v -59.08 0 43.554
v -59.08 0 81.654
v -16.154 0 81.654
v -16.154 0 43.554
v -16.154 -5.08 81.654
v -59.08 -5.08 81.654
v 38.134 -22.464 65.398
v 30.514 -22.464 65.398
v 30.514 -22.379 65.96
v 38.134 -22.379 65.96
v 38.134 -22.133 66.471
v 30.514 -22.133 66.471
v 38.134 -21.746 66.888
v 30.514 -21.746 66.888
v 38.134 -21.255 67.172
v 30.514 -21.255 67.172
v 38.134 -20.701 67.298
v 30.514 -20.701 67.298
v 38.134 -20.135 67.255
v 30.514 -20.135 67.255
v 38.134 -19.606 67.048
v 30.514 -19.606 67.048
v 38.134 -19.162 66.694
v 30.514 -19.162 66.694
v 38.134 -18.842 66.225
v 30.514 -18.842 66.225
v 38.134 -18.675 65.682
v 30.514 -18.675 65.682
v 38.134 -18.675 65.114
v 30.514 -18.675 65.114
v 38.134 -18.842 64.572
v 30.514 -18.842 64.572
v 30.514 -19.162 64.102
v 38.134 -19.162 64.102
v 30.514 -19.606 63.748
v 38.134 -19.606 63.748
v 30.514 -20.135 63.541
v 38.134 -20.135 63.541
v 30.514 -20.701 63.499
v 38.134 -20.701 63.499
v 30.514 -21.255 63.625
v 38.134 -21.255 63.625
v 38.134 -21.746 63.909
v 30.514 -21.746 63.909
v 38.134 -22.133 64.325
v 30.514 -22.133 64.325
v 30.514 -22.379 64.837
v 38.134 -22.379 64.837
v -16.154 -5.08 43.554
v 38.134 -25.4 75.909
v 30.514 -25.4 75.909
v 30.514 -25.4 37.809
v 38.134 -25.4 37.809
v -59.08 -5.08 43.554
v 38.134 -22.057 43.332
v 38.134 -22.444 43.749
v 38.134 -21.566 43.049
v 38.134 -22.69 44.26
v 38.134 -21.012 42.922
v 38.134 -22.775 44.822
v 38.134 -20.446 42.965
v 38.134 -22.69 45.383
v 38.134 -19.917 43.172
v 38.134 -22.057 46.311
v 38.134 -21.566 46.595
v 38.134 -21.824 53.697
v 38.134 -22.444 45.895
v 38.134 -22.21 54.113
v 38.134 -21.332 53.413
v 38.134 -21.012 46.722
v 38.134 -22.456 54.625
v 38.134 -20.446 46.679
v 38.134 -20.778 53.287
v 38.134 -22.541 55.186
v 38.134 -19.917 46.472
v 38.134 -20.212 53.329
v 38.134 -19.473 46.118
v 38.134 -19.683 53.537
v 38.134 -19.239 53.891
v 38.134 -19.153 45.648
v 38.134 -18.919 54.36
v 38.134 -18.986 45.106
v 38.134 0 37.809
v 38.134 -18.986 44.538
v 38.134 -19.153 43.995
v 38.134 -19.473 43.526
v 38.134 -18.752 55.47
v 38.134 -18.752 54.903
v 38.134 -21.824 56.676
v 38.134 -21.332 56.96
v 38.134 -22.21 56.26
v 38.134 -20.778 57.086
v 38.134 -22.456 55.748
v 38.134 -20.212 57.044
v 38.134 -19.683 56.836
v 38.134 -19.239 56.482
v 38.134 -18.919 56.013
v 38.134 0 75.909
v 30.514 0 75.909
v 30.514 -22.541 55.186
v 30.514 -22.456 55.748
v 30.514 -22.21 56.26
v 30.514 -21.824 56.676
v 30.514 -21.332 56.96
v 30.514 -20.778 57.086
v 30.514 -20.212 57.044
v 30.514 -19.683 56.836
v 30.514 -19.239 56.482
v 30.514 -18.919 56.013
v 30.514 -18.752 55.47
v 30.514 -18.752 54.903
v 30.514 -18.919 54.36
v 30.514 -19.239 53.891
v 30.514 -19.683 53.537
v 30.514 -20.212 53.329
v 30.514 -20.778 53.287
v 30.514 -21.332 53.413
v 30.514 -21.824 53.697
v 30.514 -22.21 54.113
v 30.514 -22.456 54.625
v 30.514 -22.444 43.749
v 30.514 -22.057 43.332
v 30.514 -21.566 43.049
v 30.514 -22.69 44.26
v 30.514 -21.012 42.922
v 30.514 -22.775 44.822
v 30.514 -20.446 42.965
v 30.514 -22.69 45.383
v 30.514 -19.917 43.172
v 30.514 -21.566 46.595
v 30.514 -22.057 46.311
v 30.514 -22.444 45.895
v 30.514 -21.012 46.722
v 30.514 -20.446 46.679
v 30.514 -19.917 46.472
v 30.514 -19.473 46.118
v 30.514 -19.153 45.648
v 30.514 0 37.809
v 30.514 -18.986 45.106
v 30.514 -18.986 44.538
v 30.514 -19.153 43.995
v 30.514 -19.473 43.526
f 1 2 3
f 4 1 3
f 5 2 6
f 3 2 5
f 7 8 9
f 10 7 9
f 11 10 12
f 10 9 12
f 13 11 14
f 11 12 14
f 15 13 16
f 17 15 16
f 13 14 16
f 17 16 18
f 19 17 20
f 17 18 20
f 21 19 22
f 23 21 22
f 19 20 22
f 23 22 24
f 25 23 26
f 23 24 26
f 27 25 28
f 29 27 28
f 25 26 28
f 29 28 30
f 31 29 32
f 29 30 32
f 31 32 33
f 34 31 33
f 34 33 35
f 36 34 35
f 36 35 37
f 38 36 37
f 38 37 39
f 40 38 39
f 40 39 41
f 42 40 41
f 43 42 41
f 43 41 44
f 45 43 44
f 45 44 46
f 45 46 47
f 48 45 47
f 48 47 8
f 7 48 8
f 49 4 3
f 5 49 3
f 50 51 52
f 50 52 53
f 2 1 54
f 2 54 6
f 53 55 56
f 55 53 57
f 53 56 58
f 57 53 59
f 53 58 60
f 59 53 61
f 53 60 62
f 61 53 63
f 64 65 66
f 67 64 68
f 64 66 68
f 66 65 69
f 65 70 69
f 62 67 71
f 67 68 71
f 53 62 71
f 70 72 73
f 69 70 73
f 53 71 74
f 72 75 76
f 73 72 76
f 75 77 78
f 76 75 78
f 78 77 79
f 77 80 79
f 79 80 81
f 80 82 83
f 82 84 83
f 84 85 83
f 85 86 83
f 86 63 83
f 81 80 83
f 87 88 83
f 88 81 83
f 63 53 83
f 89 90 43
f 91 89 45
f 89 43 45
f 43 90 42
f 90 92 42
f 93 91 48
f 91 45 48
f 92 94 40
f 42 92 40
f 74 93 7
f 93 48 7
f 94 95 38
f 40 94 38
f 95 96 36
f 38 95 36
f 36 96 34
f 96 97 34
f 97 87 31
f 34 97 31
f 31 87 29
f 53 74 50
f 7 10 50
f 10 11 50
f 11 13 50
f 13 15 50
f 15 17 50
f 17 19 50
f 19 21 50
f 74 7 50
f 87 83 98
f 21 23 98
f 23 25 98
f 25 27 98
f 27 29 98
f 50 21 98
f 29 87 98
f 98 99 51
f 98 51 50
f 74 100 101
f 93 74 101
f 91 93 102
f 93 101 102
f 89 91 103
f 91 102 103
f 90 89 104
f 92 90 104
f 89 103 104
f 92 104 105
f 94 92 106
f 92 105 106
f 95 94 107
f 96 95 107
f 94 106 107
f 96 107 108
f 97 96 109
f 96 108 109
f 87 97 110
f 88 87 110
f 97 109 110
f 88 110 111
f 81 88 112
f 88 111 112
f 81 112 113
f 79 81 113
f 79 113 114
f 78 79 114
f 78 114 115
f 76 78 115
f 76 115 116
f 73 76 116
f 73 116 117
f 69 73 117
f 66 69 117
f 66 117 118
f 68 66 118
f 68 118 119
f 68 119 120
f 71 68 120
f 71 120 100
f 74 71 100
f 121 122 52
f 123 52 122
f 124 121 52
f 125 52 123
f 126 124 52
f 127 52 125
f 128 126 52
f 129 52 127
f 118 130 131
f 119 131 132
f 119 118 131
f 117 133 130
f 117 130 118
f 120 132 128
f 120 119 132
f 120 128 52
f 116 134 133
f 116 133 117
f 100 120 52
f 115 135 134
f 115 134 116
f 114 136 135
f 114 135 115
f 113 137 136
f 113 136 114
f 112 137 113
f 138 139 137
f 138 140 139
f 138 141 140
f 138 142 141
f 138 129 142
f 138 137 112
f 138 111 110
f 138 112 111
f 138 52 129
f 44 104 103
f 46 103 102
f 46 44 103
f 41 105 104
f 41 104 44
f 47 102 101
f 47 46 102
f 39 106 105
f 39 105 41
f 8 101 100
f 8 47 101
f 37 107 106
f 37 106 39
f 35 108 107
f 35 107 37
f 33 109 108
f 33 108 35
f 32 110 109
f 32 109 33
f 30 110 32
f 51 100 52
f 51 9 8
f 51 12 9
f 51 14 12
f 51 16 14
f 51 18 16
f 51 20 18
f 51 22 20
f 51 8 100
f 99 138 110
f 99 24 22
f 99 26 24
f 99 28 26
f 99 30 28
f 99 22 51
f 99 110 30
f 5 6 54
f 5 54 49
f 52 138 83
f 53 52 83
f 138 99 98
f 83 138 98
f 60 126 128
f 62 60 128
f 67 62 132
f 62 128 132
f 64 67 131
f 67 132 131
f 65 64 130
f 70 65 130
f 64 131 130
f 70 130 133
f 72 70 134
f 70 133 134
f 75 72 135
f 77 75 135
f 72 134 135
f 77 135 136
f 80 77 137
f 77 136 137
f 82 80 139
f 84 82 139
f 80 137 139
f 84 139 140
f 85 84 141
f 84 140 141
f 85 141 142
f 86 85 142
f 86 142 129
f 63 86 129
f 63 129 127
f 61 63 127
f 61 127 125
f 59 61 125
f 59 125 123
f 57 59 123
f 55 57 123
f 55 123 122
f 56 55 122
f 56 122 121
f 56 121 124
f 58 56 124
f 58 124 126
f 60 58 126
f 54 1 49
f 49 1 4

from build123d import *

# Parameters (mm, degrees)
F0_W     = 42.926
F0_H     = 38.1
F1_DEPTH = 5.08
F2_W     = 7.62
F2_H     = 38.1
F3_DEPTH = 25.4
F4_R     = 1.905
F5_DEPTH = 25.4


with BuildPart() as f1:
    # F0 (on Front) → F1 (new body)
    with BuildSketch(Plane.XZ):
        with Locations((-37.61664, 62.604237)):
            Rectangle(F0_W, F0_H)
    extrude(amount=F1_DEPTH)


with BuildPart() as f3:
    # F2 (on Front) → F3 (new body)
    with BuildSketch(Plane.XZ):
        with Locations((34.324463, 56.858795)):
            Rectangle(F2_W, F2_H)
    extrude(amount=F3_DEPTH)

    # F4 (on face) → F5 (cut)
    with BuildSketch(Plane(origin=(30.514463, 0, 0), x_dir=(0, -1, 0), z_dir=(-1, 0, 0))):
        with Locations((20.558622, 65.398186)):
            Circle(F4_R)
        with Locations((20.635817, 55.186477)):
            Circle(F4_R)
        with Locations((20.869667, 44.821851)):
            Circle(F4_R)
    extrude(amount=-F5_DEPTH, mode=Mode.SUBTRACT)


solid = Compound([f1.part, f3.part])
